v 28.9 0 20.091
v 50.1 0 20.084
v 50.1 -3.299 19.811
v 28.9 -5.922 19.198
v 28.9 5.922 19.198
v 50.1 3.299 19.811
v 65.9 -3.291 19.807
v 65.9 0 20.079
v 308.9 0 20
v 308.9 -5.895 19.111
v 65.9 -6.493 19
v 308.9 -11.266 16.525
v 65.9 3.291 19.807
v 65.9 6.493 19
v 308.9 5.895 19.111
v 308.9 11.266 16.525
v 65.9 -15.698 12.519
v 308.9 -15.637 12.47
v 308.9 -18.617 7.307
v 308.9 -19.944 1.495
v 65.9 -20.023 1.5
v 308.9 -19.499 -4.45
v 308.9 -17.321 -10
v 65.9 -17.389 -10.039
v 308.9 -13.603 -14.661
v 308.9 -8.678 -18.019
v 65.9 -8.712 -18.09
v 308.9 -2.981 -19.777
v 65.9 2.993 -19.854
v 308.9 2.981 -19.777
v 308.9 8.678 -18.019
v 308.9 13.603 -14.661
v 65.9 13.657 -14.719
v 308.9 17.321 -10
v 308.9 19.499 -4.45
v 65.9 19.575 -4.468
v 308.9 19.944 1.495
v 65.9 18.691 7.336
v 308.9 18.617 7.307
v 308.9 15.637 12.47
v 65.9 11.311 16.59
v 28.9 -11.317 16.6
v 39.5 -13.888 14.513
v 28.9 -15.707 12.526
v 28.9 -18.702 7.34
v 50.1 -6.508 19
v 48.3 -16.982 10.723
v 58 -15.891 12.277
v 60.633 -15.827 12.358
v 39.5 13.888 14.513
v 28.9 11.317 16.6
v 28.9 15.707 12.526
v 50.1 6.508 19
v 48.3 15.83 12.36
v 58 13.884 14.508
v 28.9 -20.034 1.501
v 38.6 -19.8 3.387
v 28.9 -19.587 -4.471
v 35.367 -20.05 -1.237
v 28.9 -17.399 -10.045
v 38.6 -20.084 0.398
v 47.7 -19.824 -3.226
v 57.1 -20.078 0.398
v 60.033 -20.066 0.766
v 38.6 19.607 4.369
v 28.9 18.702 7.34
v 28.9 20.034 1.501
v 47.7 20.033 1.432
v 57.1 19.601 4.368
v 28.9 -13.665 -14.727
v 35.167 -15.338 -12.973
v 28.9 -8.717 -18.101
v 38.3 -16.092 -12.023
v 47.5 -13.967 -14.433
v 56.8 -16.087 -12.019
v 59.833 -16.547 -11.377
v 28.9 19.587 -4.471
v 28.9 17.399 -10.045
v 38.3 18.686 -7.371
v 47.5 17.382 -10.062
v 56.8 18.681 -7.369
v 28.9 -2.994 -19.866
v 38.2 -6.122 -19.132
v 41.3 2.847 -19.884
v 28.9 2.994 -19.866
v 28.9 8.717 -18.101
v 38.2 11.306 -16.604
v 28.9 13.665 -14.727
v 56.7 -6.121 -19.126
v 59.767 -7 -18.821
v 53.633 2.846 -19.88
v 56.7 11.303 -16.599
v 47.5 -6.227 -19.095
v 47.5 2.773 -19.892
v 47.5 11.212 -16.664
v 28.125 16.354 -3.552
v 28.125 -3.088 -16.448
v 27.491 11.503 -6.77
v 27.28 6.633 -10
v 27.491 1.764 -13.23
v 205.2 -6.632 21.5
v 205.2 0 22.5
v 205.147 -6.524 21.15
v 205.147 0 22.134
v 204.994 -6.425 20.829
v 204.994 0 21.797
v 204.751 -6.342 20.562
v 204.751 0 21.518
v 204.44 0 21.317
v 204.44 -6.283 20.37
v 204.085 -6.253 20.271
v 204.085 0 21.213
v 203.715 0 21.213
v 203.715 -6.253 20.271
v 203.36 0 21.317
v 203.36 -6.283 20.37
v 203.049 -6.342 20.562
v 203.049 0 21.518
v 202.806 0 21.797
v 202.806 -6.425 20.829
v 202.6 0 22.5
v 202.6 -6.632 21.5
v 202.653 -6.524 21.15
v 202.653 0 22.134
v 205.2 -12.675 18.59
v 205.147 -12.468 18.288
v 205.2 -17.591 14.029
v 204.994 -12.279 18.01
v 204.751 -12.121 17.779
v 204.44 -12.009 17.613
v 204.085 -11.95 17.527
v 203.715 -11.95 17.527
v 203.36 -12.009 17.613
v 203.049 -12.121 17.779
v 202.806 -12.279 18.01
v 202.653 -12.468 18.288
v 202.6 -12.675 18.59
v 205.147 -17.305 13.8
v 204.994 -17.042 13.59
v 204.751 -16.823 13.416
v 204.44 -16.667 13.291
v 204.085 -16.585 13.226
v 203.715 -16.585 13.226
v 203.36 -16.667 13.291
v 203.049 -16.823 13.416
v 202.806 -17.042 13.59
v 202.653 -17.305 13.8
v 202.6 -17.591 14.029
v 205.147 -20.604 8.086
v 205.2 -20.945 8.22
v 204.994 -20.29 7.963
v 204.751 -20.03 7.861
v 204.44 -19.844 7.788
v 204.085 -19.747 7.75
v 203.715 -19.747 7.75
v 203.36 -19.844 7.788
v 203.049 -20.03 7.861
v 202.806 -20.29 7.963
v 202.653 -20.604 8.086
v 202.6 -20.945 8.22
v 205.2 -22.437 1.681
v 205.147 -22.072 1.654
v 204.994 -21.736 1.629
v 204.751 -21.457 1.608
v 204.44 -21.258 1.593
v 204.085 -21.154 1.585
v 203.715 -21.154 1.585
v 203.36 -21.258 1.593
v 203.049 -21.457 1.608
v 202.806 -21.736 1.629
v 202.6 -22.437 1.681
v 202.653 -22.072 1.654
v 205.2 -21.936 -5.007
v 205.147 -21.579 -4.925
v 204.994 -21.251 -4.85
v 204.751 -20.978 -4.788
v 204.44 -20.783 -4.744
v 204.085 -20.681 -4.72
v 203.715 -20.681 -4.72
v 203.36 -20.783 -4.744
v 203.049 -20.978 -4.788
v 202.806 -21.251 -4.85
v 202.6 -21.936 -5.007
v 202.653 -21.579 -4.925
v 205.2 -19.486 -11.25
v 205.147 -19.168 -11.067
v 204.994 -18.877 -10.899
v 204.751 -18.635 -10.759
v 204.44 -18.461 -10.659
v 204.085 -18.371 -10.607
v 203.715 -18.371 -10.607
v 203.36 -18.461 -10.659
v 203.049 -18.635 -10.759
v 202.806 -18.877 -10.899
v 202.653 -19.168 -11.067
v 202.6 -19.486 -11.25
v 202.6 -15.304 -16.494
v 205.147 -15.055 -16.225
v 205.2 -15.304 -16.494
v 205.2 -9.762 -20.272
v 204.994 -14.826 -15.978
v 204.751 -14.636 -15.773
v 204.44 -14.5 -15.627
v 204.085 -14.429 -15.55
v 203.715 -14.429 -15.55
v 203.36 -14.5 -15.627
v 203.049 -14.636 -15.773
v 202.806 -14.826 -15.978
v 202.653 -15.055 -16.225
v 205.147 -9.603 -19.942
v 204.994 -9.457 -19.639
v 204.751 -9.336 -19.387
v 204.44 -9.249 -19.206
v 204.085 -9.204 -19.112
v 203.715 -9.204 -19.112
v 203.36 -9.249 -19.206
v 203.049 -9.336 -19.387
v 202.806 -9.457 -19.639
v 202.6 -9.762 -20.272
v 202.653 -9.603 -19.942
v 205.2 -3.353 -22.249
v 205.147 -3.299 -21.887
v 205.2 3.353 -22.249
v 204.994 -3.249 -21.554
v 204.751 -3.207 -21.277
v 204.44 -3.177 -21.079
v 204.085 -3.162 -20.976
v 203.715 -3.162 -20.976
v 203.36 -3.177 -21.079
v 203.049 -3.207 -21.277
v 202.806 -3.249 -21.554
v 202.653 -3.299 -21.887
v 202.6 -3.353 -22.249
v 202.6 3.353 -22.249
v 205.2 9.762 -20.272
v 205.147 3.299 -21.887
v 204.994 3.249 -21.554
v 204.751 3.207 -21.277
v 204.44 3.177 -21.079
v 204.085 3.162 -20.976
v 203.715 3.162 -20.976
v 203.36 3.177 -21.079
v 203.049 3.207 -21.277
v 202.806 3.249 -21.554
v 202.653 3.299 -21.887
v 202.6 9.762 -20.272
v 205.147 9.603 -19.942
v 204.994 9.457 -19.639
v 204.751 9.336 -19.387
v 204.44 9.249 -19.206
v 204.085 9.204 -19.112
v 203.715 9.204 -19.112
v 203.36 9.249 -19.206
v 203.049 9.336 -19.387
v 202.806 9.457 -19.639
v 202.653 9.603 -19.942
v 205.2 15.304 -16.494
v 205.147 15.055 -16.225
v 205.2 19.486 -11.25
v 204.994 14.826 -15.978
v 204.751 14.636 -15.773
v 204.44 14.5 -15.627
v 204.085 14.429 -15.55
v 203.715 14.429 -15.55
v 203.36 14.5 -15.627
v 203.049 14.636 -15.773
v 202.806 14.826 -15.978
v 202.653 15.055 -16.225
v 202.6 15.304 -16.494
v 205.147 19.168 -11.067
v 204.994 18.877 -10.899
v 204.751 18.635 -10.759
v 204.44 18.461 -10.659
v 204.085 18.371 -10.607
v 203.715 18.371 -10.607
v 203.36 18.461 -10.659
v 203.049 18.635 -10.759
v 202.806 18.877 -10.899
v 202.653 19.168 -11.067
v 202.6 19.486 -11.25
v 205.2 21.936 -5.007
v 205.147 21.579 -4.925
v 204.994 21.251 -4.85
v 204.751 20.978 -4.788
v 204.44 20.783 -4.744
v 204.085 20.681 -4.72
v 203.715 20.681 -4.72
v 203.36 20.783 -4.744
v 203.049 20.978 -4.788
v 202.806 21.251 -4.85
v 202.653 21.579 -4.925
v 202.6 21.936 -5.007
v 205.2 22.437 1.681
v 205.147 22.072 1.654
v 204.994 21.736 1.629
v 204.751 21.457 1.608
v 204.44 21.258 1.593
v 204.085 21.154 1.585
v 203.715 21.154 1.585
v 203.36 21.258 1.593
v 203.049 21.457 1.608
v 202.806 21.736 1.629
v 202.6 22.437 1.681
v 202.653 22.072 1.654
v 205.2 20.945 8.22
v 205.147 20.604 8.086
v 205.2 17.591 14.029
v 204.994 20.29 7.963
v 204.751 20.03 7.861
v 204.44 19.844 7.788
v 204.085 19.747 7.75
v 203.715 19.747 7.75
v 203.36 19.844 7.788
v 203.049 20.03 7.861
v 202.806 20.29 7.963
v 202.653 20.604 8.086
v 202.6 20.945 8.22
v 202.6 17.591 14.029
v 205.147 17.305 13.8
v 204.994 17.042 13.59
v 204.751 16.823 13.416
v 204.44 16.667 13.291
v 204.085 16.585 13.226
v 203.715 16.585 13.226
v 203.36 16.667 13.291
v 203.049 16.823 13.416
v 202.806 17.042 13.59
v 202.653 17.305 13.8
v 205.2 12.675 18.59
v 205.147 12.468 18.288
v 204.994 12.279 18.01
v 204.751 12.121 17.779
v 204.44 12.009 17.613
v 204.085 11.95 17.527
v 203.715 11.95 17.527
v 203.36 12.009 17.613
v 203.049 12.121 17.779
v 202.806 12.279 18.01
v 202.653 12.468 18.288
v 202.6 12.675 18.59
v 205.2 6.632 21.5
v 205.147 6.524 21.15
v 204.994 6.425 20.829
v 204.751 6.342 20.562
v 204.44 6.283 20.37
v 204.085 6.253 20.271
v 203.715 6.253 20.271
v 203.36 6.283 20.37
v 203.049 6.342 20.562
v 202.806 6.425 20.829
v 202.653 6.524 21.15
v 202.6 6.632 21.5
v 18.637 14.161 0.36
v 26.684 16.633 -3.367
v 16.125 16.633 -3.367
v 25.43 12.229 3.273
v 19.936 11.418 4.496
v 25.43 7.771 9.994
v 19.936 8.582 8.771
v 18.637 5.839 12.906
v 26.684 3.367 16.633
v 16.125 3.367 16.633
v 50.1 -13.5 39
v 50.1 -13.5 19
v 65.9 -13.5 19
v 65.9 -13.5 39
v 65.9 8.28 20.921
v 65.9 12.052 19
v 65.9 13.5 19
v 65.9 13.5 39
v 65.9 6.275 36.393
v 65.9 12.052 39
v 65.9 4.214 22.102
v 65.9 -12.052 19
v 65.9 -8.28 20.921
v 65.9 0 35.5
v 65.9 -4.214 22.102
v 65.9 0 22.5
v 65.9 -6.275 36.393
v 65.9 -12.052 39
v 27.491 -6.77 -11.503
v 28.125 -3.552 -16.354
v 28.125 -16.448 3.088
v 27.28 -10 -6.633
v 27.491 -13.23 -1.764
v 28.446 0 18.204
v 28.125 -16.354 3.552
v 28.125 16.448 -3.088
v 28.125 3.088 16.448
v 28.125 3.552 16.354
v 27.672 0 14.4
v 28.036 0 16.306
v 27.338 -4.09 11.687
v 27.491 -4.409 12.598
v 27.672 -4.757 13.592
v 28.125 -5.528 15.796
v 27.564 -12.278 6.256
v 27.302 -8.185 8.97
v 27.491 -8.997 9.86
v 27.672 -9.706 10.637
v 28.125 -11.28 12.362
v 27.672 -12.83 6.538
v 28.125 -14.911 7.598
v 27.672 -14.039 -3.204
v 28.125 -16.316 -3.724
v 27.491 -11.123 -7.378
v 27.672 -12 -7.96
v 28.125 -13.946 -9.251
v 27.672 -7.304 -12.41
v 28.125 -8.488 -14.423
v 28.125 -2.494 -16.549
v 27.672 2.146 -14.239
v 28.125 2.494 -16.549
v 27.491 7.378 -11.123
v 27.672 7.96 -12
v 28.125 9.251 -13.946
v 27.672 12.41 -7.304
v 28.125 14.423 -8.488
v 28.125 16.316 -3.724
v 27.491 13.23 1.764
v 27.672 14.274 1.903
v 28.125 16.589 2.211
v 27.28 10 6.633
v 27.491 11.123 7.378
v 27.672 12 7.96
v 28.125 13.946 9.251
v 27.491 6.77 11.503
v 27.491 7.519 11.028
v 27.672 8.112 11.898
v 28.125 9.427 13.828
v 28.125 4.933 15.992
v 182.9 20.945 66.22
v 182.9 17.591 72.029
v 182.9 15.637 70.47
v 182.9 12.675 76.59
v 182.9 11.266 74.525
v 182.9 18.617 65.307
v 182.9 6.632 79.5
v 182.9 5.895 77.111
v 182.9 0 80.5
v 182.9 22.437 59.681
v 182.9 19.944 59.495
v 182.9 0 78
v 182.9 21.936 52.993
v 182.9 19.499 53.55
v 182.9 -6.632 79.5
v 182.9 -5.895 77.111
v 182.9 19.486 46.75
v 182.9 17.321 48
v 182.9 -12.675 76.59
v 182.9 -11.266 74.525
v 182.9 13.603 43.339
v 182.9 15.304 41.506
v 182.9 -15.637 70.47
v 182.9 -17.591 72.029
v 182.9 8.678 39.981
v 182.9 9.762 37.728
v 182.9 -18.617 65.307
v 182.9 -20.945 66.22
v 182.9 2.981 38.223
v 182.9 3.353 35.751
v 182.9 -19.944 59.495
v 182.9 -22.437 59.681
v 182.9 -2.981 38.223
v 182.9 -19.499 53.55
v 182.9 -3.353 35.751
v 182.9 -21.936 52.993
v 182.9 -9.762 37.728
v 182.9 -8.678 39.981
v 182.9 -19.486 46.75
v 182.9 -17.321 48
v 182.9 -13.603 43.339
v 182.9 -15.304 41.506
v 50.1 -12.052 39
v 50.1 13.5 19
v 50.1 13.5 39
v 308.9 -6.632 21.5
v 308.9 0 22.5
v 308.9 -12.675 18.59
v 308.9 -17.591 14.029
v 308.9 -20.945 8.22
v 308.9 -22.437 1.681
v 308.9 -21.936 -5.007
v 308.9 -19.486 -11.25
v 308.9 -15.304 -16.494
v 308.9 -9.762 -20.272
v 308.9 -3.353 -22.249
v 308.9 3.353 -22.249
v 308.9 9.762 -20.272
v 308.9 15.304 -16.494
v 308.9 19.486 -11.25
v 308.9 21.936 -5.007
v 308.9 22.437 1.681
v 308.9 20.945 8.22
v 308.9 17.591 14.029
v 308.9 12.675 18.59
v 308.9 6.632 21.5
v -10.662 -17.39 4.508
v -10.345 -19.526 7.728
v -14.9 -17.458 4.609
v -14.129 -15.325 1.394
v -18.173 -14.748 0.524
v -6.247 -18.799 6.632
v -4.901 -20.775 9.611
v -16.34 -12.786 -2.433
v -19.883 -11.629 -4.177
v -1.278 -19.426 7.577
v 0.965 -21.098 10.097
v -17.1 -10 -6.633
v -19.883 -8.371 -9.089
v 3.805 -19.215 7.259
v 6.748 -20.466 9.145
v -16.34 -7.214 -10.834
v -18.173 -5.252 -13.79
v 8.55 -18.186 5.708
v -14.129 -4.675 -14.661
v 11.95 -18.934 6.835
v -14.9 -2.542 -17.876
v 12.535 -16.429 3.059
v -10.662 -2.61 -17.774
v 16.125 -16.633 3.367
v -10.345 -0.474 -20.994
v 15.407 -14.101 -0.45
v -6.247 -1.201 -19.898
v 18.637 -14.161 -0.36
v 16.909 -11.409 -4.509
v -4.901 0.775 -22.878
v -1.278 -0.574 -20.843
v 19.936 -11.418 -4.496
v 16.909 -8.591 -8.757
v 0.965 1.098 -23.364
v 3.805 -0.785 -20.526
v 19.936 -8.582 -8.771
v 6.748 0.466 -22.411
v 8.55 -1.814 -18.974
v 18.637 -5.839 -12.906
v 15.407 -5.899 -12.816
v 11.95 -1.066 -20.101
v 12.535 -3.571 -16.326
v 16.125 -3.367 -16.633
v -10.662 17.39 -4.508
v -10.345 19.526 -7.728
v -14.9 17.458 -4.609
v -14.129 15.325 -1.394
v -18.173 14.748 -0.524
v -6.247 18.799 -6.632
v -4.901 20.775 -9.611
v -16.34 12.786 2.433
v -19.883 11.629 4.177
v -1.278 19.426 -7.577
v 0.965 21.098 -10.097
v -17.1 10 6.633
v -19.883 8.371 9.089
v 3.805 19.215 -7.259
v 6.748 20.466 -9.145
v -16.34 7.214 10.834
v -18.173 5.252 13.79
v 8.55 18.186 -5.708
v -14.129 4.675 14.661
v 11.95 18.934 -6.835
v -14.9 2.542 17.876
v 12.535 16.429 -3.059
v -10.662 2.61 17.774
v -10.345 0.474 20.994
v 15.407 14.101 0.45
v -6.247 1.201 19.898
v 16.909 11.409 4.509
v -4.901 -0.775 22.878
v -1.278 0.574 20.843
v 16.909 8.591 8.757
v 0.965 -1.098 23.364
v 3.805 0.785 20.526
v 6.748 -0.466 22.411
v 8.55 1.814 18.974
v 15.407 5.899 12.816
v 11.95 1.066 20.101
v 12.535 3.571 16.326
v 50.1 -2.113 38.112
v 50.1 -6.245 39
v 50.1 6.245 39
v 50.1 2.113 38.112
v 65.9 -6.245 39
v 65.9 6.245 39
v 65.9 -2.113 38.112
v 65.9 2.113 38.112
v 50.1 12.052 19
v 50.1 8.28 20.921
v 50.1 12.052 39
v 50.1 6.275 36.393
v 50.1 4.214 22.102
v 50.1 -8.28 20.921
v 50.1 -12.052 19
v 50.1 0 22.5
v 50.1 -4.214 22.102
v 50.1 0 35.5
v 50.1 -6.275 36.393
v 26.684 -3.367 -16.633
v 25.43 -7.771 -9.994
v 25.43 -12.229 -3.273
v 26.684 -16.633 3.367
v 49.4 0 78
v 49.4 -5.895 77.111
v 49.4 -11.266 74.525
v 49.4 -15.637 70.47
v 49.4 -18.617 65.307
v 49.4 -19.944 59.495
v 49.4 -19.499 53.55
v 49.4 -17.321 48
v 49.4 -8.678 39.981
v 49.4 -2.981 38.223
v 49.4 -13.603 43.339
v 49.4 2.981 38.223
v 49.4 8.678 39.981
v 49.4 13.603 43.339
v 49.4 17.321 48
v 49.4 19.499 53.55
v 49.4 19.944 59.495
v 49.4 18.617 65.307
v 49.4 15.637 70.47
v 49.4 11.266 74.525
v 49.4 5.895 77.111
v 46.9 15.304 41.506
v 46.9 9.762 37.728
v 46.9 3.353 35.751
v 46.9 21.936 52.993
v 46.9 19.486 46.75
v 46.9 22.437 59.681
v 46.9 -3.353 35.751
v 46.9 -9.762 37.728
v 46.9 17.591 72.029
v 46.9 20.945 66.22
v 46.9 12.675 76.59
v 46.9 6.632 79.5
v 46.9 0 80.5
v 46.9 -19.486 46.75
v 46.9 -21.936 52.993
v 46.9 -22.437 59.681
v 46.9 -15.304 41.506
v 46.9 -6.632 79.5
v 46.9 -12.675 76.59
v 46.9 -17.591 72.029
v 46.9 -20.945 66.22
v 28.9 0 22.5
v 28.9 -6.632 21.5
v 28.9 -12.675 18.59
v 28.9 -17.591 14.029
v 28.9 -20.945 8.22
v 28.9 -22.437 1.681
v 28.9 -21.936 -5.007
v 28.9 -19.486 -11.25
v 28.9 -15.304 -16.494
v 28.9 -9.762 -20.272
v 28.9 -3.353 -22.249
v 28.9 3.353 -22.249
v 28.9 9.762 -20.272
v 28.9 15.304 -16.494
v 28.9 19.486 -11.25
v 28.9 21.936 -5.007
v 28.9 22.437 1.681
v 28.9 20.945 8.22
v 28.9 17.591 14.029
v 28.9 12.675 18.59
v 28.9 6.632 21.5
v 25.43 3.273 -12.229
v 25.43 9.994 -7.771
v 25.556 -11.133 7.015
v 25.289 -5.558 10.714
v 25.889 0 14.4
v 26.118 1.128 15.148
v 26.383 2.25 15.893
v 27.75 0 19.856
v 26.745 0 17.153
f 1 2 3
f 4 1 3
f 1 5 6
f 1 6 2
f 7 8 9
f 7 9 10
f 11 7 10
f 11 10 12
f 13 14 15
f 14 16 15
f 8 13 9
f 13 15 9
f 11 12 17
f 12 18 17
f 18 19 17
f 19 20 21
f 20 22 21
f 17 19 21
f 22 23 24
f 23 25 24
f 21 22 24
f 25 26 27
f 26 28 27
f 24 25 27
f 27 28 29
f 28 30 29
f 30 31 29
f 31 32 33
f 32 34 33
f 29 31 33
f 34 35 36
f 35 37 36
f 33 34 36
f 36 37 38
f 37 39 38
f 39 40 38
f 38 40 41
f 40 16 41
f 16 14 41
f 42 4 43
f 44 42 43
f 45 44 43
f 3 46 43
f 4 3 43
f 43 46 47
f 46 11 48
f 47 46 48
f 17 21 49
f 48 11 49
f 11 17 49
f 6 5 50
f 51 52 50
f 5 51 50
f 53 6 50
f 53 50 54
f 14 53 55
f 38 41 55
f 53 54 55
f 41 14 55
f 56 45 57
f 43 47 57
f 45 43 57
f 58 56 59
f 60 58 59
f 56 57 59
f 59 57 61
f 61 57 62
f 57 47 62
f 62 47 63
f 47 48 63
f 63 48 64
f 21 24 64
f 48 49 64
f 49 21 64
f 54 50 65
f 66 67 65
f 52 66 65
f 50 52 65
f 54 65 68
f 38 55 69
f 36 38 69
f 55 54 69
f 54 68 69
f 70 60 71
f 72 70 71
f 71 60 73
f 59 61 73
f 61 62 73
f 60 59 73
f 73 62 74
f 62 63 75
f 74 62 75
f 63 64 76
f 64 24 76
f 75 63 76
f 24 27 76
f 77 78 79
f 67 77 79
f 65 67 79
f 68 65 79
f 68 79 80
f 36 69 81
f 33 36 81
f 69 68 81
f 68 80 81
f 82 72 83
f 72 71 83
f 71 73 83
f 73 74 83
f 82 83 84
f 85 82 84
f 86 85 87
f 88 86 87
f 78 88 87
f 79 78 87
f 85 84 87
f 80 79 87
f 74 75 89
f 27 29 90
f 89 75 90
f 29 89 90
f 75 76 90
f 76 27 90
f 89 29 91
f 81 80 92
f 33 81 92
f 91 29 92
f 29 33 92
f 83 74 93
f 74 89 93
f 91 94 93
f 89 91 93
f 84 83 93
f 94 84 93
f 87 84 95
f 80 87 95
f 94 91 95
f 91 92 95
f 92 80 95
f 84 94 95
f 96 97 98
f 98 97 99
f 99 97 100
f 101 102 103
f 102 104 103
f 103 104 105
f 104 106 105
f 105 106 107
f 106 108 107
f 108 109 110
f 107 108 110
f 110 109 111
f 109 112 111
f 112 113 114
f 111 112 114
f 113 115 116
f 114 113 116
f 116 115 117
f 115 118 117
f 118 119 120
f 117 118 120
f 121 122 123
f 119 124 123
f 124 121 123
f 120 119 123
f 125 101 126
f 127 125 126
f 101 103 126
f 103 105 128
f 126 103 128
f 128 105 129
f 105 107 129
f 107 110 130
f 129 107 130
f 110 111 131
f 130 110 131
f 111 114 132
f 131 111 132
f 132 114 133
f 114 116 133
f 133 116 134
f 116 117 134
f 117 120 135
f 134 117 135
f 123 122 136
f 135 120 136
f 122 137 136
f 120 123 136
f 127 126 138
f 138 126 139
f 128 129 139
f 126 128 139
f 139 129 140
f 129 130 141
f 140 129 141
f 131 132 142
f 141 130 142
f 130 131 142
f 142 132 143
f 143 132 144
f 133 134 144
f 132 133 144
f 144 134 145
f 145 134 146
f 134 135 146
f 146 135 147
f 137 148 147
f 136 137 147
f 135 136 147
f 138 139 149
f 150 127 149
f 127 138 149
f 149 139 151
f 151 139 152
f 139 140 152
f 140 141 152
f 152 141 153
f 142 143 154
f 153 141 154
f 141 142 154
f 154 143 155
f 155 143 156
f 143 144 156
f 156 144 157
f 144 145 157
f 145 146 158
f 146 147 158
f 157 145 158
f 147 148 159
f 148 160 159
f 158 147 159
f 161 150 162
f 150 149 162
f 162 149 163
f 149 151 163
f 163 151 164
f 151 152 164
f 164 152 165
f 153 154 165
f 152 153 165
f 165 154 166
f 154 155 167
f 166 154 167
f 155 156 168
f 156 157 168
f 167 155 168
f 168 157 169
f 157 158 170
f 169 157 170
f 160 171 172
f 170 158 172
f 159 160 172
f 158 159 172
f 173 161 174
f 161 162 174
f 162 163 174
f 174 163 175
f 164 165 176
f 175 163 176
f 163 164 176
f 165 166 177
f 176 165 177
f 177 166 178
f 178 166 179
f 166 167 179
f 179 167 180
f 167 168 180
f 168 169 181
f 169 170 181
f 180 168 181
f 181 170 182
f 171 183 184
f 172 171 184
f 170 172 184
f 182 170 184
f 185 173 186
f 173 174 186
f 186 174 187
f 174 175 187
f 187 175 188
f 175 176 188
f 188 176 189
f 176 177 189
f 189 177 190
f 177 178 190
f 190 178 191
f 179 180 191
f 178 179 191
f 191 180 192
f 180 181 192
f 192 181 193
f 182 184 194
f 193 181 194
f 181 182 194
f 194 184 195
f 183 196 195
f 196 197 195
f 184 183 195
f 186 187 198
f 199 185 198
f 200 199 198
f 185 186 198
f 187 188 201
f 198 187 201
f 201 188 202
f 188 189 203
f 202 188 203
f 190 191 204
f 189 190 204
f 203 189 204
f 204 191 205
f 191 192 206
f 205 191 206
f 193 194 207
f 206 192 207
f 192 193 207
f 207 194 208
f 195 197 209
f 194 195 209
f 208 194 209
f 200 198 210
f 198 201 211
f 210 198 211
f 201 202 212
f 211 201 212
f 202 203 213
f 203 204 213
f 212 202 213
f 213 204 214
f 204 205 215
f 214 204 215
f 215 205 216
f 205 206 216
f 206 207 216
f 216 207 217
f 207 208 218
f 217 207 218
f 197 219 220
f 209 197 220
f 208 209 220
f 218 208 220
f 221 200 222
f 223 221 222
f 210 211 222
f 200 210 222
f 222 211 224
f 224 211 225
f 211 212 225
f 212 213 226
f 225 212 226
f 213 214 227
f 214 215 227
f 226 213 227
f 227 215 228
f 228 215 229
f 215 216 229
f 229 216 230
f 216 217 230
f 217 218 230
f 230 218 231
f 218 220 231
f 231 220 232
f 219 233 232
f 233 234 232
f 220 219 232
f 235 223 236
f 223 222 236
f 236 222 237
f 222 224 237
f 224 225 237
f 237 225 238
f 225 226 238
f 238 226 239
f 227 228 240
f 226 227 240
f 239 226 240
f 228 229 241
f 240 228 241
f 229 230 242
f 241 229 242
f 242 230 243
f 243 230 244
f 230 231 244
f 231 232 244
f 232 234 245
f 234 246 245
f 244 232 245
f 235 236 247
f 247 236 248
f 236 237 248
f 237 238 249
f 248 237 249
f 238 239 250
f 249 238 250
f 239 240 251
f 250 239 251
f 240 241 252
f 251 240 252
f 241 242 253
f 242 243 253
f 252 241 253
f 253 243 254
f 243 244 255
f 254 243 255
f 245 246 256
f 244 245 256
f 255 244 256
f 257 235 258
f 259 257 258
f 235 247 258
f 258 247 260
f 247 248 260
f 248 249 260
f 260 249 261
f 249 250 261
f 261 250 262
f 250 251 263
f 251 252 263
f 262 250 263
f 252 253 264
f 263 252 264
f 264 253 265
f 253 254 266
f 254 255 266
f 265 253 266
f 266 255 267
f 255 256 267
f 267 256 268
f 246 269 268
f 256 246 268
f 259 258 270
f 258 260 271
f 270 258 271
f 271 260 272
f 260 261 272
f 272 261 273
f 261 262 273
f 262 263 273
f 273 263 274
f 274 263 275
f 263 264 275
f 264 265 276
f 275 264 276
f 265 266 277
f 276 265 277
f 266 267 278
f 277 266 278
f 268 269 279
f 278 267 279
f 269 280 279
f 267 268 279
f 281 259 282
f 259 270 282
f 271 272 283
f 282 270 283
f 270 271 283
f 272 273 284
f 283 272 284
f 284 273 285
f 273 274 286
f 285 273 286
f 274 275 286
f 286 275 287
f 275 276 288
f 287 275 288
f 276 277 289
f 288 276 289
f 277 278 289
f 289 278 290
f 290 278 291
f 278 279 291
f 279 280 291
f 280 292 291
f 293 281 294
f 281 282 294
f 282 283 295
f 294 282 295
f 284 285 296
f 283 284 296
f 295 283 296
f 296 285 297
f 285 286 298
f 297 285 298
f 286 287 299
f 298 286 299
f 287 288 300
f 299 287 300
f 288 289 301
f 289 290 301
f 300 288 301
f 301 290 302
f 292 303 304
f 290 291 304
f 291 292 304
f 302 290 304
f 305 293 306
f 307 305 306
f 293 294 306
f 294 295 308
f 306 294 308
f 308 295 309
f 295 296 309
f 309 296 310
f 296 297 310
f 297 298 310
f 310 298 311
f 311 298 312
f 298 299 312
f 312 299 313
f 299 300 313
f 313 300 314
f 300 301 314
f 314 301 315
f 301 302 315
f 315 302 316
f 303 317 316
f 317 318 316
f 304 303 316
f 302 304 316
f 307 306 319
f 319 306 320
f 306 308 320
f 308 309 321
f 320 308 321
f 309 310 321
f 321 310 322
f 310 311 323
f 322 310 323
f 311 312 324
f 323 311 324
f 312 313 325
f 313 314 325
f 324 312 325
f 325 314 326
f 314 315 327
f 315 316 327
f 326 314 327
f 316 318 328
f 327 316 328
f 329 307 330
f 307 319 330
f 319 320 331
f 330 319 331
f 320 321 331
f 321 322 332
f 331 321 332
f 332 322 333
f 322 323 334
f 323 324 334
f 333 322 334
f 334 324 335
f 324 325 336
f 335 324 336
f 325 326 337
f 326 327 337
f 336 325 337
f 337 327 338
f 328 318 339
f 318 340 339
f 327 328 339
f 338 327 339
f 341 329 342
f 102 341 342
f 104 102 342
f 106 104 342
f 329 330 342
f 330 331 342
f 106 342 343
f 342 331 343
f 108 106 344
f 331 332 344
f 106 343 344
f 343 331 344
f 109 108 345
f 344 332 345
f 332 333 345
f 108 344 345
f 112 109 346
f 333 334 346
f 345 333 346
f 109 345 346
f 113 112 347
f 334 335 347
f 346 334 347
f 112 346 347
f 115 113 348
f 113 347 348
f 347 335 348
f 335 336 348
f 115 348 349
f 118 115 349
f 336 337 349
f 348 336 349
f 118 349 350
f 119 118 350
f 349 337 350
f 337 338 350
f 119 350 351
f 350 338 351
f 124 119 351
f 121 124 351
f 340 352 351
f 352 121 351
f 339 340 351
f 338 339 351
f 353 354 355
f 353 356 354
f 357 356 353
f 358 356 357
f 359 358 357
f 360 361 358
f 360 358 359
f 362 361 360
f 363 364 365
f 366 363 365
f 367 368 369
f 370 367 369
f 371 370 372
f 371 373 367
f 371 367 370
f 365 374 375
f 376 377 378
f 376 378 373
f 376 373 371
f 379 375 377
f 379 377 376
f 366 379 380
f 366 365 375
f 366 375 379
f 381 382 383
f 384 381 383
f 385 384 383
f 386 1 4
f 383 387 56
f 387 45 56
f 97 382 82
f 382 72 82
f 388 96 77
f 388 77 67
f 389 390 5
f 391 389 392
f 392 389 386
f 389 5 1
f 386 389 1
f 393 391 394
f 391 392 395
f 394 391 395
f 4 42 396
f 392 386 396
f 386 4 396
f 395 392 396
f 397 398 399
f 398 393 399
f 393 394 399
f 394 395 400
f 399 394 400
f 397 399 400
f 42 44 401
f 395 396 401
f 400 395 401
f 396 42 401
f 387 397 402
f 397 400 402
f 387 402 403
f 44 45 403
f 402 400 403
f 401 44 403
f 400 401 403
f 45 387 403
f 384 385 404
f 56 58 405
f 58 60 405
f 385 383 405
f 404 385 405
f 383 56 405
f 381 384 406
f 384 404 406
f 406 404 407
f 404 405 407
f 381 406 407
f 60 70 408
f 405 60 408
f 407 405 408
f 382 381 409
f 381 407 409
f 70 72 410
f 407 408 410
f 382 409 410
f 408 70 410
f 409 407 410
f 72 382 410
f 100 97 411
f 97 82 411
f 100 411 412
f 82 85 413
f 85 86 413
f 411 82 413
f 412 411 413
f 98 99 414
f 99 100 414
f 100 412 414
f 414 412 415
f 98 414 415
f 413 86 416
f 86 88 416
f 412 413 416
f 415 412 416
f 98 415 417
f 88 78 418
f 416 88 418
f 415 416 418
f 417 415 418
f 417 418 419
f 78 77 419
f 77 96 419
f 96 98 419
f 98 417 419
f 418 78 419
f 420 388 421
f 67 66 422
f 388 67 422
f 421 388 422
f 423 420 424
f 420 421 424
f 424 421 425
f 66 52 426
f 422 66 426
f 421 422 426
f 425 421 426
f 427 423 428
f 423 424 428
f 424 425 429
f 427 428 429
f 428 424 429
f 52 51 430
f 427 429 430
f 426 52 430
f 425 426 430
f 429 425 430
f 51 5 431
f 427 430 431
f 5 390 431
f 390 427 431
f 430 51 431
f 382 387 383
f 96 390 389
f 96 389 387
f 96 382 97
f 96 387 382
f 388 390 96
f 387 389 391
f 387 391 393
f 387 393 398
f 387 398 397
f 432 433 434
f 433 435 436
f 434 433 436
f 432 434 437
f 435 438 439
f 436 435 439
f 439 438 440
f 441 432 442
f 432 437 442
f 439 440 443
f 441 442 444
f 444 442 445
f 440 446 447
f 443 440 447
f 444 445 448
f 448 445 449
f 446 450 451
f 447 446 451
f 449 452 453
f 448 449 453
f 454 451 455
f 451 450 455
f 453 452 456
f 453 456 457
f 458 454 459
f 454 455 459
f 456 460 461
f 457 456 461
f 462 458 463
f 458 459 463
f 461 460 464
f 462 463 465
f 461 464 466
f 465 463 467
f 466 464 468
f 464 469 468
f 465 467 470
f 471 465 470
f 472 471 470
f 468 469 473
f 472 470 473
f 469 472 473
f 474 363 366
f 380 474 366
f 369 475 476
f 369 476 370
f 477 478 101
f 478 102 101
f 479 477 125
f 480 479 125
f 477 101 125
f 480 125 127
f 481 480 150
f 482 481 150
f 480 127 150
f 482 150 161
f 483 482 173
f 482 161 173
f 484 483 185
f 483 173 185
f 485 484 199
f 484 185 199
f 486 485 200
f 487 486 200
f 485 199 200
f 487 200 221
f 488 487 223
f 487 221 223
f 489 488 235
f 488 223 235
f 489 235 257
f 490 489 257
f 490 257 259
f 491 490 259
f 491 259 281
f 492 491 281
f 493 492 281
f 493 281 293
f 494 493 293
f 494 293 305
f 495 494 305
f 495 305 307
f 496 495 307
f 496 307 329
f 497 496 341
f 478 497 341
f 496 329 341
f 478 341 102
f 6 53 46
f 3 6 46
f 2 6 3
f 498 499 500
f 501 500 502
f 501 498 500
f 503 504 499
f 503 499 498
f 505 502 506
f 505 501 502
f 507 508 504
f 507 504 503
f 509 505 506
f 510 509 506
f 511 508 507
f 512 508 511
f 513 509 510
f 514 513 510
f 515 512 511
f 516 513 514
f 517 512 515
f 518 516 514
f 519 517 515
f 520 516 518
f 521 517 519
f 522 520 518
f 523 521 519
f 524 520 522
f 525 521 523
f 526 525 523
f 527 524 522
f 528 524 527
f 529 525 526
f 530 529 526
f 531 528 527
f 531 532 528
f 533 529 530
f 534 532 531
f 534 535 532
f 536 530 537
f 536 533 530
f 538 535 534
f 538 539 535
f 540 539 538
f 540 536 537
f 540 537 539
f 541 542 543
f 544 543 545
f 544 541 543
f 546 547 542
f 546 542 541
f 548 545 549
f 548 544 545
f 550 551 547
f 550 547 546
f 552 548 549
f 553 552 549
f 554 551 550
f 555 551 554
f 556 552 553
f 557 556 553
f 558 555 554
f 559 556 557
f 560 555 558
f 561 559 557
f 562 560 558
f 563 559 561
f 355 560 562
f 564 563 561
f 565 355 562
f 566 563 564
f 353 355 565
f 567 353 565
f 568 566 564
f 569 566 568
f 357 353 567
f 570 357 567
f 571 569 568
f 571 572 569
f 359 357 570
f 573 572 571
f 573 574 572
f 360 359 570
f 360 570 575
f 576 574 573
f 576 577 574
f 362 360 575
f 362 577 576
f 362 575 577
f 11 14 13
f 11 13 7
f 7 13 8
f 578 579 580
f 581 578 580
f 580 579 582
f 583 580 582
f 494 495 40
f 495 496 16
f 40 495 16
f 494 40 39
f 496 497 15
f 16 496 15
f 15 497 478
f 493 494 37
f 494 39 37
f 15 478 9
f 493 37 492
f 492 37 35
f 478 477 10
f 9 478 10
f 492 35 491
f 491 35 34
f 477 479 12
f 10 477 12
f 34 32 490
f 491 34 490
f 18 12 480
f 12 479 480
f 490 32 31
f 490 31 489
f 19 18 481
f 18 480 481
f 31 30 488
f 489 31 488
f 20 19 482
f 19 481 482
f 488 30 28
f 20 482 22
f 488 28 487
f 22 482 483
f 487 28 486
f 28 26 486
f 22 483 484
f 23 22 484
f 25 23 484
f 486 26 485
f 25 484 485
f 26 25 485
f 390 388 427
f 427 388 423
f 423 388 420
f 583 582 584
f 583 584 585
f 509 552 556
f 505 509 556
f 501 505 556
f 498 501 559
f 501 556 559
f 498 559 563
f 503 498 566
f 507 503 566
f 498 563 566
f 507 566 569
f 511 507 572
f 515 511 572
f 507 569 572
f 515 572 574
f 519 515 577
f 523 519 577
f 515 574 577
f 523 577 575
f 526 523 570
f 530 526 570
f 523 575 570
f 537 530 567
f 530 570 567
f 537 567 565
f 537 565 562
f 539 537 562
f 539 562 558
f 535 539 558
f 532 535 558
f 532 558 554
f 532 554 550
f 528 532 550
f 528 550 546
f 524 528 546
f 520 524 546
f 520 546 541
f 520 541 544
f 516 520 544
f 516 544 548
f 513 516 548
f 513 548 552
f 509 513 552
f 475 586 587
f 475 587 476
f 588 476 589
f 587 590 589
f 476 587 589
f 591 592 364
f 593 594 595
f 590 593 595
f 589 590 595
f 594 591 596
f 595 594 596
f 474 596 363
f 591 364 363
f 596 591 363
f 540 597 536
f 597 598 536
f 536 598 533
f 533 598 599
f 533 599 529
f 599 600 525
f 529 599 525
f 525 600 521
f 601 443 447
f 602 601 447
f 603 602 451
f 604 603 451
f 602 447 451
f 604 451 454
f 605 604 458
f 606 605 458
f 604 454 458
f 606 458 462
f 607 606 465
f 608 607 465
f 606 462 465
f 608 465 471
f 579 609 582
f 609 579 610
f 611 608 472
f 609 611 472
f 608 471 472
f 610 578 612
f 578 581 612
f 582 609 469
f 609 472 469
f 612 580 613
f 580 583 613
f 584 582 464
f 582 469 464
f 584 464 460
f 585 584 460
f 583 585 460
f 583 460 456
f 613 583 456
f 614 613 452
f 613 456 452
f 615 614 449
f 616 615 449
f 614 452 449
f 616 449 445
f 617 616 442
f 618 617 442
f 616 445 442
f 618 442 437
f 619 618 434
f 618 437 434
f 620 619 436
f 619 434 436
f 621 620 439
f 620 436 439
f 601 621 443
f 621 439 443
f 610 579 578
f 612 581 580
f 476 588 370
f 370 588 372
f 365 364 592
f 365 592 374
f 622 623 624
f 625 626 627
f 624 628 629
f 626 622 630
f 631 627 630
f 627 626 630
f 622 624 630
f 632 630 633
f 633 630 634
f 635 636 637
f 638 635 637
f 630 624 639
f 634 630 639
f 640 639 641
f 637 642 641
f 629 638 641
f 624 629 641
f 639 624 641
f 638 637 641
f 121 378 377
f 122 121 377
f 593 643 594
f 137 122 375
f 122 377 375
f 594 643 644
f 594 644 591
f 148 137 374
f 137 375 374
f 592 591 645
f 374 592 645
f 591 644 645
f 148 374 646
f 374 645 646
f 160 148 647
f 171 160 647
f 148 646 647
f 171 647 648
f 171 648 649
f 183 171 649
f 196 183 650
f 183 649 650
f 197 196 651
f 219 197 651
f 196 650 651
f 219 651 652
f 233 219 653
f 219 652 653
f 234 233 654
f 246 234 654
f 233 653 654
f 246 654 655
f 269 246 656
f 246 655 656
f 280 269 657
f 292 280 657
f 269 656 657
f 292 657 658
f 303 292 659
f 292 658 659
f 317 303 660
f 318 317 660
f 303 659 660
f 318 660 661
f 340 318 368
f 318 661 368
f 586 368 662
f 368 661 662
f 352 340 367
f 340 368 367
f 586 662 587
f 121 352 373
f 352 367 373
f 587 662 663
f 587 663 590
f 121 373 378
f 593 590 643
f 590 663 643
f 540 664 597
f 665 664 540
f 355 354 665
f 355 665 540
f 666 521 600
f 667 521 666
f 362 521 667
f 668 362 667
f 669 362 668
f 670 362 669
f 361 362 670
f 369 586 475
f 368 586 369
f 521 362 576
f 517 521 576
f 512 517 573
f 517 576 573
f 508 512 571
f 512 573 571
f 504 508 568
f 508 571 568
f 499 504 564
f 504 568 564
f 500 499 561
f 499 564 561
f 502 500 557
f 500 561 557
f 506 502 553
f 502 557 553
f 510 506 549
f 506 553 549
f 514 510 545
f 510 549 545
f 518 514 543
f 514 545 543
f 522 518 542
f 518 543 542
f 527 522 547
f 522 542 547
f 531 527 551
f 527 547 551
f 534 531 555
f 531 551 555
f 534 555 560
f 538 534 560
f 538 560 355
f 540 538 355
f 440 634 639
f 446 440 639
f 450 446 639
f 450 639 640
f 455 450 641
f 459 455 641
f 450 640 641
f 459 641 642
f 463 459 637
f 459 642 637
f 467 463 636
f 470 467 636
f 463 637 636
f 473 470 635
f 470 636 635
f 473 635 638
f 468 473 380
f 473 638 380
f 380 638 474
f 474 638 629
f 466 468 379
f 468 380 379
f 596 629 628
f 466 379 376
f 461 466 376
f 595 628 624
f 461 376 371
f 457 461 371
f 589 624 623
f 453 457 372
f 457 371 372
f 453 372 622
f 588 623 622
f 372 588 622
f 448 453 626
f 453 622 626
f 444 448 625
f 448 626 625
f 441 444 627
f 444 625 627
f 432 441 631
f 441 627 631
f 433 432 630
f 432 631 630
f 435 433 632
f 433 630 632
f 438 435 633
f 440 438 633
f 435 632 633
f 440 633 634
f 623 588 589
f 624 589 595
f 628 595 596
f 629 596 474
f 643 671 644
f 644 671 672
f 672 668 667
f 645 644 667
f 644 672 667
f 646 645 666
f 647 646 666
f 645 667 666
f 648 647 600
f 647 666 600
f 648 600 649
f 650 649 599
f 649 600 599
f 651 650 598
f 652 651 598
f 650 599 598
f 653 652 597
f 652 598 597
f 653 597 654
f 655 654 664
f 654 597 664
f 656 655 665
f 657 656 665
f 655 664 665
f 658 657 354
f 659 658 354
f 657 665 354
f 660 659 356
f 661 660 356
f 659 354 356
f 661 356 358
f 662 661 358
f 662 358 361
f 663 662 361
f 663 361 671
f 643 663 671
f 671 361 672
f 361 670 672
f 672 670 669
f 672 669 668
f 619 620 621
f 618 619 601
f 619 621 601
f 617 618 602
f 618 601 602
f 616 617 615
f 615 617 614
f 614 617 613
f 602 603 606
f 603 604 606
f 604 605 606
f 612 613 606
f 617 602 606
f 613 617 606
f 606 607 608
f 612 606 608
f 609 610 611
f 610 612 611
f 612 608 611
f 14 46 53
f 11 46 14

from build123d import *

# Parameters (mm, degrees)
F4_W      = 15.8
F4_H      = 20
F5_DEPTH  = 13.5
F7_DEPTH  = 20.1
F8_R      = 17.1
F9_DEPTH  = 25
F11_DEPTH = 24


with BuildPart() as f1:
    # F0 (on Front) → F1 (revolve)
    with BuildSketch(Plane.XZ):
        with BuildLine():
            Line((28.9, 20.0906451762), (308.9, 20))
            Line((308.9, 20), (308.9, 22.5))
            Line((308.9, 22.5), (205.2, 22.5))
            ThreePointArc((205.2, 22.5), (203.9, 21.2), (202.6, 22.5))
            Line((202.6, 22.5), (28.9, 22.5))
            Line((28.9, 22.5), (28.9, 20.0906451762))
        make_face()
        with BuildLine():
            ThreePointArc((26.400000374, 0), (27.0246011146, 10.1231447503), (28.9, 20.0906451762))
            Line((28.9, 20.0906451762), (28.9, 22.5))
            ThreePointArc((28.9, 22.5), (25.1650624277, 11.5244305716), (23.9, 0))
            Line((23.9, 0), (26.400000374, 0))
        make_face()
    revolve(axis=Axis((168.9, 0, 0), (1, 0, 0)))



with BuildPart() as f3:
    # F2 (on Front) → F3 (revolve)
    with BuildSketch(Plane.XZ):
        Polygon((49.4, 78), (182.9, 78), (182.9, 80.5), (46.9, 80.5), (46.9, 58), (49.4, 58), align=None)
    revolve(axis=Axis((114.9, 0, 58), (1, 0, 0)))


with BuildPart() as f1_1:
    add(f1.part)

    add(f3.part)  # F5 merges F3
    # F4 (on Front) → F5 (join, symmetric)
    with BuildSketch(Plane.XZ):
        with Locations((58, 29)):
            Rectangle(F4_W, F4_H)
    extrude(amount=F5_DEPTH, both=True)



with BuildPart() as f7:
    # F6 (on Right) → F7 (new body, symmetric)
    with BuildSketch(Plane.YZ):
        Polygon((-1.1106930477, 23.3832495807), (-21.1106930477, 10.1167504193), (1.1106930477, -23.3832495807), (21.1106930477, -10.1167504193), align=None)
    extrude(amount=F7_DEPTH, both=True)

    # F8 (on face) → F9 (cut)
    with BuildSketch(Plane(origin=(0, 10, 6.6332495807), x_dir=(-1, 0, 0), z_dir=(0, 0.8333333333, 0.5527707984))):
        with BuildLine():
            Line((-20.1, -20.1), (4.99e-08, -20.1))
            ThreePointArc((4.99e-08, -20.1), (-14.2128462562, -14.2128463475), (-20.1, -7.91e-08))
            Line((-20.1, -7.91e-08), (-20.1, -20.1))
        make_face()
        with BuildLine():
            Line((20.1, -20.1), (20.1, 0))
            ThreePointArc((20.1, 0), (14.2128463195, -14.2128462842), (4.99e-08, -20.1))
            Line((4.99e-08, -20.1), (20.1, -20.1))
        make_face()
        with BuildLine():
            ThreePointArc((-1.76e-08, 20.1), (14.2128462956, 14.2128463081), (20.1, 0))
            Line((20.1, 0), (20.1, 20.1))
            Line((20.1, 20.1), (-1.76e-08, 20.1))
        make_face()
        with BuildLine():
            ThreePointArc((-20.1, -7.91e-08), (-14.212846336, 14.2128462677), (-1.76e-08, 20.1))
            Line((-1.76e-08, 20.1), (-20.1, 20.1))
            Line((-20.1, 20.1), (-20.1, -7.91e-08))
        make_face()
        Circle(F8_R)
    extrude(amount=-F9_DEPTH, mode=Mode.SUBTRACT)


with BuildPart() as f1_2:
    add(f1_1.part)

    add(f7.part)  # F11 merges F7
    # F10 (on face) → F11 (join)
    with BuildSketch(Plane(origin=(0, 10, 6.6332495807), x_dir=(-1, 0, 0), z_dir=(0, 0.8333333333, 0.5527707984))):
        with BuildLine():
            ThreePointArc((-16.1248255805, -12), (-20.1, 0), (-16.1248255805, 12))
            Line((-16.1248255805, 12), (-28.1248255805, 12))
            Line((-28.1248255805, 12), (-28.1248255805, -12))
            Line((-28.1248255805, -12), (-16.1248255805, -12))
        make_face()
    extrude(amount=-F11_DEPTH)


solid = f1_2.part
